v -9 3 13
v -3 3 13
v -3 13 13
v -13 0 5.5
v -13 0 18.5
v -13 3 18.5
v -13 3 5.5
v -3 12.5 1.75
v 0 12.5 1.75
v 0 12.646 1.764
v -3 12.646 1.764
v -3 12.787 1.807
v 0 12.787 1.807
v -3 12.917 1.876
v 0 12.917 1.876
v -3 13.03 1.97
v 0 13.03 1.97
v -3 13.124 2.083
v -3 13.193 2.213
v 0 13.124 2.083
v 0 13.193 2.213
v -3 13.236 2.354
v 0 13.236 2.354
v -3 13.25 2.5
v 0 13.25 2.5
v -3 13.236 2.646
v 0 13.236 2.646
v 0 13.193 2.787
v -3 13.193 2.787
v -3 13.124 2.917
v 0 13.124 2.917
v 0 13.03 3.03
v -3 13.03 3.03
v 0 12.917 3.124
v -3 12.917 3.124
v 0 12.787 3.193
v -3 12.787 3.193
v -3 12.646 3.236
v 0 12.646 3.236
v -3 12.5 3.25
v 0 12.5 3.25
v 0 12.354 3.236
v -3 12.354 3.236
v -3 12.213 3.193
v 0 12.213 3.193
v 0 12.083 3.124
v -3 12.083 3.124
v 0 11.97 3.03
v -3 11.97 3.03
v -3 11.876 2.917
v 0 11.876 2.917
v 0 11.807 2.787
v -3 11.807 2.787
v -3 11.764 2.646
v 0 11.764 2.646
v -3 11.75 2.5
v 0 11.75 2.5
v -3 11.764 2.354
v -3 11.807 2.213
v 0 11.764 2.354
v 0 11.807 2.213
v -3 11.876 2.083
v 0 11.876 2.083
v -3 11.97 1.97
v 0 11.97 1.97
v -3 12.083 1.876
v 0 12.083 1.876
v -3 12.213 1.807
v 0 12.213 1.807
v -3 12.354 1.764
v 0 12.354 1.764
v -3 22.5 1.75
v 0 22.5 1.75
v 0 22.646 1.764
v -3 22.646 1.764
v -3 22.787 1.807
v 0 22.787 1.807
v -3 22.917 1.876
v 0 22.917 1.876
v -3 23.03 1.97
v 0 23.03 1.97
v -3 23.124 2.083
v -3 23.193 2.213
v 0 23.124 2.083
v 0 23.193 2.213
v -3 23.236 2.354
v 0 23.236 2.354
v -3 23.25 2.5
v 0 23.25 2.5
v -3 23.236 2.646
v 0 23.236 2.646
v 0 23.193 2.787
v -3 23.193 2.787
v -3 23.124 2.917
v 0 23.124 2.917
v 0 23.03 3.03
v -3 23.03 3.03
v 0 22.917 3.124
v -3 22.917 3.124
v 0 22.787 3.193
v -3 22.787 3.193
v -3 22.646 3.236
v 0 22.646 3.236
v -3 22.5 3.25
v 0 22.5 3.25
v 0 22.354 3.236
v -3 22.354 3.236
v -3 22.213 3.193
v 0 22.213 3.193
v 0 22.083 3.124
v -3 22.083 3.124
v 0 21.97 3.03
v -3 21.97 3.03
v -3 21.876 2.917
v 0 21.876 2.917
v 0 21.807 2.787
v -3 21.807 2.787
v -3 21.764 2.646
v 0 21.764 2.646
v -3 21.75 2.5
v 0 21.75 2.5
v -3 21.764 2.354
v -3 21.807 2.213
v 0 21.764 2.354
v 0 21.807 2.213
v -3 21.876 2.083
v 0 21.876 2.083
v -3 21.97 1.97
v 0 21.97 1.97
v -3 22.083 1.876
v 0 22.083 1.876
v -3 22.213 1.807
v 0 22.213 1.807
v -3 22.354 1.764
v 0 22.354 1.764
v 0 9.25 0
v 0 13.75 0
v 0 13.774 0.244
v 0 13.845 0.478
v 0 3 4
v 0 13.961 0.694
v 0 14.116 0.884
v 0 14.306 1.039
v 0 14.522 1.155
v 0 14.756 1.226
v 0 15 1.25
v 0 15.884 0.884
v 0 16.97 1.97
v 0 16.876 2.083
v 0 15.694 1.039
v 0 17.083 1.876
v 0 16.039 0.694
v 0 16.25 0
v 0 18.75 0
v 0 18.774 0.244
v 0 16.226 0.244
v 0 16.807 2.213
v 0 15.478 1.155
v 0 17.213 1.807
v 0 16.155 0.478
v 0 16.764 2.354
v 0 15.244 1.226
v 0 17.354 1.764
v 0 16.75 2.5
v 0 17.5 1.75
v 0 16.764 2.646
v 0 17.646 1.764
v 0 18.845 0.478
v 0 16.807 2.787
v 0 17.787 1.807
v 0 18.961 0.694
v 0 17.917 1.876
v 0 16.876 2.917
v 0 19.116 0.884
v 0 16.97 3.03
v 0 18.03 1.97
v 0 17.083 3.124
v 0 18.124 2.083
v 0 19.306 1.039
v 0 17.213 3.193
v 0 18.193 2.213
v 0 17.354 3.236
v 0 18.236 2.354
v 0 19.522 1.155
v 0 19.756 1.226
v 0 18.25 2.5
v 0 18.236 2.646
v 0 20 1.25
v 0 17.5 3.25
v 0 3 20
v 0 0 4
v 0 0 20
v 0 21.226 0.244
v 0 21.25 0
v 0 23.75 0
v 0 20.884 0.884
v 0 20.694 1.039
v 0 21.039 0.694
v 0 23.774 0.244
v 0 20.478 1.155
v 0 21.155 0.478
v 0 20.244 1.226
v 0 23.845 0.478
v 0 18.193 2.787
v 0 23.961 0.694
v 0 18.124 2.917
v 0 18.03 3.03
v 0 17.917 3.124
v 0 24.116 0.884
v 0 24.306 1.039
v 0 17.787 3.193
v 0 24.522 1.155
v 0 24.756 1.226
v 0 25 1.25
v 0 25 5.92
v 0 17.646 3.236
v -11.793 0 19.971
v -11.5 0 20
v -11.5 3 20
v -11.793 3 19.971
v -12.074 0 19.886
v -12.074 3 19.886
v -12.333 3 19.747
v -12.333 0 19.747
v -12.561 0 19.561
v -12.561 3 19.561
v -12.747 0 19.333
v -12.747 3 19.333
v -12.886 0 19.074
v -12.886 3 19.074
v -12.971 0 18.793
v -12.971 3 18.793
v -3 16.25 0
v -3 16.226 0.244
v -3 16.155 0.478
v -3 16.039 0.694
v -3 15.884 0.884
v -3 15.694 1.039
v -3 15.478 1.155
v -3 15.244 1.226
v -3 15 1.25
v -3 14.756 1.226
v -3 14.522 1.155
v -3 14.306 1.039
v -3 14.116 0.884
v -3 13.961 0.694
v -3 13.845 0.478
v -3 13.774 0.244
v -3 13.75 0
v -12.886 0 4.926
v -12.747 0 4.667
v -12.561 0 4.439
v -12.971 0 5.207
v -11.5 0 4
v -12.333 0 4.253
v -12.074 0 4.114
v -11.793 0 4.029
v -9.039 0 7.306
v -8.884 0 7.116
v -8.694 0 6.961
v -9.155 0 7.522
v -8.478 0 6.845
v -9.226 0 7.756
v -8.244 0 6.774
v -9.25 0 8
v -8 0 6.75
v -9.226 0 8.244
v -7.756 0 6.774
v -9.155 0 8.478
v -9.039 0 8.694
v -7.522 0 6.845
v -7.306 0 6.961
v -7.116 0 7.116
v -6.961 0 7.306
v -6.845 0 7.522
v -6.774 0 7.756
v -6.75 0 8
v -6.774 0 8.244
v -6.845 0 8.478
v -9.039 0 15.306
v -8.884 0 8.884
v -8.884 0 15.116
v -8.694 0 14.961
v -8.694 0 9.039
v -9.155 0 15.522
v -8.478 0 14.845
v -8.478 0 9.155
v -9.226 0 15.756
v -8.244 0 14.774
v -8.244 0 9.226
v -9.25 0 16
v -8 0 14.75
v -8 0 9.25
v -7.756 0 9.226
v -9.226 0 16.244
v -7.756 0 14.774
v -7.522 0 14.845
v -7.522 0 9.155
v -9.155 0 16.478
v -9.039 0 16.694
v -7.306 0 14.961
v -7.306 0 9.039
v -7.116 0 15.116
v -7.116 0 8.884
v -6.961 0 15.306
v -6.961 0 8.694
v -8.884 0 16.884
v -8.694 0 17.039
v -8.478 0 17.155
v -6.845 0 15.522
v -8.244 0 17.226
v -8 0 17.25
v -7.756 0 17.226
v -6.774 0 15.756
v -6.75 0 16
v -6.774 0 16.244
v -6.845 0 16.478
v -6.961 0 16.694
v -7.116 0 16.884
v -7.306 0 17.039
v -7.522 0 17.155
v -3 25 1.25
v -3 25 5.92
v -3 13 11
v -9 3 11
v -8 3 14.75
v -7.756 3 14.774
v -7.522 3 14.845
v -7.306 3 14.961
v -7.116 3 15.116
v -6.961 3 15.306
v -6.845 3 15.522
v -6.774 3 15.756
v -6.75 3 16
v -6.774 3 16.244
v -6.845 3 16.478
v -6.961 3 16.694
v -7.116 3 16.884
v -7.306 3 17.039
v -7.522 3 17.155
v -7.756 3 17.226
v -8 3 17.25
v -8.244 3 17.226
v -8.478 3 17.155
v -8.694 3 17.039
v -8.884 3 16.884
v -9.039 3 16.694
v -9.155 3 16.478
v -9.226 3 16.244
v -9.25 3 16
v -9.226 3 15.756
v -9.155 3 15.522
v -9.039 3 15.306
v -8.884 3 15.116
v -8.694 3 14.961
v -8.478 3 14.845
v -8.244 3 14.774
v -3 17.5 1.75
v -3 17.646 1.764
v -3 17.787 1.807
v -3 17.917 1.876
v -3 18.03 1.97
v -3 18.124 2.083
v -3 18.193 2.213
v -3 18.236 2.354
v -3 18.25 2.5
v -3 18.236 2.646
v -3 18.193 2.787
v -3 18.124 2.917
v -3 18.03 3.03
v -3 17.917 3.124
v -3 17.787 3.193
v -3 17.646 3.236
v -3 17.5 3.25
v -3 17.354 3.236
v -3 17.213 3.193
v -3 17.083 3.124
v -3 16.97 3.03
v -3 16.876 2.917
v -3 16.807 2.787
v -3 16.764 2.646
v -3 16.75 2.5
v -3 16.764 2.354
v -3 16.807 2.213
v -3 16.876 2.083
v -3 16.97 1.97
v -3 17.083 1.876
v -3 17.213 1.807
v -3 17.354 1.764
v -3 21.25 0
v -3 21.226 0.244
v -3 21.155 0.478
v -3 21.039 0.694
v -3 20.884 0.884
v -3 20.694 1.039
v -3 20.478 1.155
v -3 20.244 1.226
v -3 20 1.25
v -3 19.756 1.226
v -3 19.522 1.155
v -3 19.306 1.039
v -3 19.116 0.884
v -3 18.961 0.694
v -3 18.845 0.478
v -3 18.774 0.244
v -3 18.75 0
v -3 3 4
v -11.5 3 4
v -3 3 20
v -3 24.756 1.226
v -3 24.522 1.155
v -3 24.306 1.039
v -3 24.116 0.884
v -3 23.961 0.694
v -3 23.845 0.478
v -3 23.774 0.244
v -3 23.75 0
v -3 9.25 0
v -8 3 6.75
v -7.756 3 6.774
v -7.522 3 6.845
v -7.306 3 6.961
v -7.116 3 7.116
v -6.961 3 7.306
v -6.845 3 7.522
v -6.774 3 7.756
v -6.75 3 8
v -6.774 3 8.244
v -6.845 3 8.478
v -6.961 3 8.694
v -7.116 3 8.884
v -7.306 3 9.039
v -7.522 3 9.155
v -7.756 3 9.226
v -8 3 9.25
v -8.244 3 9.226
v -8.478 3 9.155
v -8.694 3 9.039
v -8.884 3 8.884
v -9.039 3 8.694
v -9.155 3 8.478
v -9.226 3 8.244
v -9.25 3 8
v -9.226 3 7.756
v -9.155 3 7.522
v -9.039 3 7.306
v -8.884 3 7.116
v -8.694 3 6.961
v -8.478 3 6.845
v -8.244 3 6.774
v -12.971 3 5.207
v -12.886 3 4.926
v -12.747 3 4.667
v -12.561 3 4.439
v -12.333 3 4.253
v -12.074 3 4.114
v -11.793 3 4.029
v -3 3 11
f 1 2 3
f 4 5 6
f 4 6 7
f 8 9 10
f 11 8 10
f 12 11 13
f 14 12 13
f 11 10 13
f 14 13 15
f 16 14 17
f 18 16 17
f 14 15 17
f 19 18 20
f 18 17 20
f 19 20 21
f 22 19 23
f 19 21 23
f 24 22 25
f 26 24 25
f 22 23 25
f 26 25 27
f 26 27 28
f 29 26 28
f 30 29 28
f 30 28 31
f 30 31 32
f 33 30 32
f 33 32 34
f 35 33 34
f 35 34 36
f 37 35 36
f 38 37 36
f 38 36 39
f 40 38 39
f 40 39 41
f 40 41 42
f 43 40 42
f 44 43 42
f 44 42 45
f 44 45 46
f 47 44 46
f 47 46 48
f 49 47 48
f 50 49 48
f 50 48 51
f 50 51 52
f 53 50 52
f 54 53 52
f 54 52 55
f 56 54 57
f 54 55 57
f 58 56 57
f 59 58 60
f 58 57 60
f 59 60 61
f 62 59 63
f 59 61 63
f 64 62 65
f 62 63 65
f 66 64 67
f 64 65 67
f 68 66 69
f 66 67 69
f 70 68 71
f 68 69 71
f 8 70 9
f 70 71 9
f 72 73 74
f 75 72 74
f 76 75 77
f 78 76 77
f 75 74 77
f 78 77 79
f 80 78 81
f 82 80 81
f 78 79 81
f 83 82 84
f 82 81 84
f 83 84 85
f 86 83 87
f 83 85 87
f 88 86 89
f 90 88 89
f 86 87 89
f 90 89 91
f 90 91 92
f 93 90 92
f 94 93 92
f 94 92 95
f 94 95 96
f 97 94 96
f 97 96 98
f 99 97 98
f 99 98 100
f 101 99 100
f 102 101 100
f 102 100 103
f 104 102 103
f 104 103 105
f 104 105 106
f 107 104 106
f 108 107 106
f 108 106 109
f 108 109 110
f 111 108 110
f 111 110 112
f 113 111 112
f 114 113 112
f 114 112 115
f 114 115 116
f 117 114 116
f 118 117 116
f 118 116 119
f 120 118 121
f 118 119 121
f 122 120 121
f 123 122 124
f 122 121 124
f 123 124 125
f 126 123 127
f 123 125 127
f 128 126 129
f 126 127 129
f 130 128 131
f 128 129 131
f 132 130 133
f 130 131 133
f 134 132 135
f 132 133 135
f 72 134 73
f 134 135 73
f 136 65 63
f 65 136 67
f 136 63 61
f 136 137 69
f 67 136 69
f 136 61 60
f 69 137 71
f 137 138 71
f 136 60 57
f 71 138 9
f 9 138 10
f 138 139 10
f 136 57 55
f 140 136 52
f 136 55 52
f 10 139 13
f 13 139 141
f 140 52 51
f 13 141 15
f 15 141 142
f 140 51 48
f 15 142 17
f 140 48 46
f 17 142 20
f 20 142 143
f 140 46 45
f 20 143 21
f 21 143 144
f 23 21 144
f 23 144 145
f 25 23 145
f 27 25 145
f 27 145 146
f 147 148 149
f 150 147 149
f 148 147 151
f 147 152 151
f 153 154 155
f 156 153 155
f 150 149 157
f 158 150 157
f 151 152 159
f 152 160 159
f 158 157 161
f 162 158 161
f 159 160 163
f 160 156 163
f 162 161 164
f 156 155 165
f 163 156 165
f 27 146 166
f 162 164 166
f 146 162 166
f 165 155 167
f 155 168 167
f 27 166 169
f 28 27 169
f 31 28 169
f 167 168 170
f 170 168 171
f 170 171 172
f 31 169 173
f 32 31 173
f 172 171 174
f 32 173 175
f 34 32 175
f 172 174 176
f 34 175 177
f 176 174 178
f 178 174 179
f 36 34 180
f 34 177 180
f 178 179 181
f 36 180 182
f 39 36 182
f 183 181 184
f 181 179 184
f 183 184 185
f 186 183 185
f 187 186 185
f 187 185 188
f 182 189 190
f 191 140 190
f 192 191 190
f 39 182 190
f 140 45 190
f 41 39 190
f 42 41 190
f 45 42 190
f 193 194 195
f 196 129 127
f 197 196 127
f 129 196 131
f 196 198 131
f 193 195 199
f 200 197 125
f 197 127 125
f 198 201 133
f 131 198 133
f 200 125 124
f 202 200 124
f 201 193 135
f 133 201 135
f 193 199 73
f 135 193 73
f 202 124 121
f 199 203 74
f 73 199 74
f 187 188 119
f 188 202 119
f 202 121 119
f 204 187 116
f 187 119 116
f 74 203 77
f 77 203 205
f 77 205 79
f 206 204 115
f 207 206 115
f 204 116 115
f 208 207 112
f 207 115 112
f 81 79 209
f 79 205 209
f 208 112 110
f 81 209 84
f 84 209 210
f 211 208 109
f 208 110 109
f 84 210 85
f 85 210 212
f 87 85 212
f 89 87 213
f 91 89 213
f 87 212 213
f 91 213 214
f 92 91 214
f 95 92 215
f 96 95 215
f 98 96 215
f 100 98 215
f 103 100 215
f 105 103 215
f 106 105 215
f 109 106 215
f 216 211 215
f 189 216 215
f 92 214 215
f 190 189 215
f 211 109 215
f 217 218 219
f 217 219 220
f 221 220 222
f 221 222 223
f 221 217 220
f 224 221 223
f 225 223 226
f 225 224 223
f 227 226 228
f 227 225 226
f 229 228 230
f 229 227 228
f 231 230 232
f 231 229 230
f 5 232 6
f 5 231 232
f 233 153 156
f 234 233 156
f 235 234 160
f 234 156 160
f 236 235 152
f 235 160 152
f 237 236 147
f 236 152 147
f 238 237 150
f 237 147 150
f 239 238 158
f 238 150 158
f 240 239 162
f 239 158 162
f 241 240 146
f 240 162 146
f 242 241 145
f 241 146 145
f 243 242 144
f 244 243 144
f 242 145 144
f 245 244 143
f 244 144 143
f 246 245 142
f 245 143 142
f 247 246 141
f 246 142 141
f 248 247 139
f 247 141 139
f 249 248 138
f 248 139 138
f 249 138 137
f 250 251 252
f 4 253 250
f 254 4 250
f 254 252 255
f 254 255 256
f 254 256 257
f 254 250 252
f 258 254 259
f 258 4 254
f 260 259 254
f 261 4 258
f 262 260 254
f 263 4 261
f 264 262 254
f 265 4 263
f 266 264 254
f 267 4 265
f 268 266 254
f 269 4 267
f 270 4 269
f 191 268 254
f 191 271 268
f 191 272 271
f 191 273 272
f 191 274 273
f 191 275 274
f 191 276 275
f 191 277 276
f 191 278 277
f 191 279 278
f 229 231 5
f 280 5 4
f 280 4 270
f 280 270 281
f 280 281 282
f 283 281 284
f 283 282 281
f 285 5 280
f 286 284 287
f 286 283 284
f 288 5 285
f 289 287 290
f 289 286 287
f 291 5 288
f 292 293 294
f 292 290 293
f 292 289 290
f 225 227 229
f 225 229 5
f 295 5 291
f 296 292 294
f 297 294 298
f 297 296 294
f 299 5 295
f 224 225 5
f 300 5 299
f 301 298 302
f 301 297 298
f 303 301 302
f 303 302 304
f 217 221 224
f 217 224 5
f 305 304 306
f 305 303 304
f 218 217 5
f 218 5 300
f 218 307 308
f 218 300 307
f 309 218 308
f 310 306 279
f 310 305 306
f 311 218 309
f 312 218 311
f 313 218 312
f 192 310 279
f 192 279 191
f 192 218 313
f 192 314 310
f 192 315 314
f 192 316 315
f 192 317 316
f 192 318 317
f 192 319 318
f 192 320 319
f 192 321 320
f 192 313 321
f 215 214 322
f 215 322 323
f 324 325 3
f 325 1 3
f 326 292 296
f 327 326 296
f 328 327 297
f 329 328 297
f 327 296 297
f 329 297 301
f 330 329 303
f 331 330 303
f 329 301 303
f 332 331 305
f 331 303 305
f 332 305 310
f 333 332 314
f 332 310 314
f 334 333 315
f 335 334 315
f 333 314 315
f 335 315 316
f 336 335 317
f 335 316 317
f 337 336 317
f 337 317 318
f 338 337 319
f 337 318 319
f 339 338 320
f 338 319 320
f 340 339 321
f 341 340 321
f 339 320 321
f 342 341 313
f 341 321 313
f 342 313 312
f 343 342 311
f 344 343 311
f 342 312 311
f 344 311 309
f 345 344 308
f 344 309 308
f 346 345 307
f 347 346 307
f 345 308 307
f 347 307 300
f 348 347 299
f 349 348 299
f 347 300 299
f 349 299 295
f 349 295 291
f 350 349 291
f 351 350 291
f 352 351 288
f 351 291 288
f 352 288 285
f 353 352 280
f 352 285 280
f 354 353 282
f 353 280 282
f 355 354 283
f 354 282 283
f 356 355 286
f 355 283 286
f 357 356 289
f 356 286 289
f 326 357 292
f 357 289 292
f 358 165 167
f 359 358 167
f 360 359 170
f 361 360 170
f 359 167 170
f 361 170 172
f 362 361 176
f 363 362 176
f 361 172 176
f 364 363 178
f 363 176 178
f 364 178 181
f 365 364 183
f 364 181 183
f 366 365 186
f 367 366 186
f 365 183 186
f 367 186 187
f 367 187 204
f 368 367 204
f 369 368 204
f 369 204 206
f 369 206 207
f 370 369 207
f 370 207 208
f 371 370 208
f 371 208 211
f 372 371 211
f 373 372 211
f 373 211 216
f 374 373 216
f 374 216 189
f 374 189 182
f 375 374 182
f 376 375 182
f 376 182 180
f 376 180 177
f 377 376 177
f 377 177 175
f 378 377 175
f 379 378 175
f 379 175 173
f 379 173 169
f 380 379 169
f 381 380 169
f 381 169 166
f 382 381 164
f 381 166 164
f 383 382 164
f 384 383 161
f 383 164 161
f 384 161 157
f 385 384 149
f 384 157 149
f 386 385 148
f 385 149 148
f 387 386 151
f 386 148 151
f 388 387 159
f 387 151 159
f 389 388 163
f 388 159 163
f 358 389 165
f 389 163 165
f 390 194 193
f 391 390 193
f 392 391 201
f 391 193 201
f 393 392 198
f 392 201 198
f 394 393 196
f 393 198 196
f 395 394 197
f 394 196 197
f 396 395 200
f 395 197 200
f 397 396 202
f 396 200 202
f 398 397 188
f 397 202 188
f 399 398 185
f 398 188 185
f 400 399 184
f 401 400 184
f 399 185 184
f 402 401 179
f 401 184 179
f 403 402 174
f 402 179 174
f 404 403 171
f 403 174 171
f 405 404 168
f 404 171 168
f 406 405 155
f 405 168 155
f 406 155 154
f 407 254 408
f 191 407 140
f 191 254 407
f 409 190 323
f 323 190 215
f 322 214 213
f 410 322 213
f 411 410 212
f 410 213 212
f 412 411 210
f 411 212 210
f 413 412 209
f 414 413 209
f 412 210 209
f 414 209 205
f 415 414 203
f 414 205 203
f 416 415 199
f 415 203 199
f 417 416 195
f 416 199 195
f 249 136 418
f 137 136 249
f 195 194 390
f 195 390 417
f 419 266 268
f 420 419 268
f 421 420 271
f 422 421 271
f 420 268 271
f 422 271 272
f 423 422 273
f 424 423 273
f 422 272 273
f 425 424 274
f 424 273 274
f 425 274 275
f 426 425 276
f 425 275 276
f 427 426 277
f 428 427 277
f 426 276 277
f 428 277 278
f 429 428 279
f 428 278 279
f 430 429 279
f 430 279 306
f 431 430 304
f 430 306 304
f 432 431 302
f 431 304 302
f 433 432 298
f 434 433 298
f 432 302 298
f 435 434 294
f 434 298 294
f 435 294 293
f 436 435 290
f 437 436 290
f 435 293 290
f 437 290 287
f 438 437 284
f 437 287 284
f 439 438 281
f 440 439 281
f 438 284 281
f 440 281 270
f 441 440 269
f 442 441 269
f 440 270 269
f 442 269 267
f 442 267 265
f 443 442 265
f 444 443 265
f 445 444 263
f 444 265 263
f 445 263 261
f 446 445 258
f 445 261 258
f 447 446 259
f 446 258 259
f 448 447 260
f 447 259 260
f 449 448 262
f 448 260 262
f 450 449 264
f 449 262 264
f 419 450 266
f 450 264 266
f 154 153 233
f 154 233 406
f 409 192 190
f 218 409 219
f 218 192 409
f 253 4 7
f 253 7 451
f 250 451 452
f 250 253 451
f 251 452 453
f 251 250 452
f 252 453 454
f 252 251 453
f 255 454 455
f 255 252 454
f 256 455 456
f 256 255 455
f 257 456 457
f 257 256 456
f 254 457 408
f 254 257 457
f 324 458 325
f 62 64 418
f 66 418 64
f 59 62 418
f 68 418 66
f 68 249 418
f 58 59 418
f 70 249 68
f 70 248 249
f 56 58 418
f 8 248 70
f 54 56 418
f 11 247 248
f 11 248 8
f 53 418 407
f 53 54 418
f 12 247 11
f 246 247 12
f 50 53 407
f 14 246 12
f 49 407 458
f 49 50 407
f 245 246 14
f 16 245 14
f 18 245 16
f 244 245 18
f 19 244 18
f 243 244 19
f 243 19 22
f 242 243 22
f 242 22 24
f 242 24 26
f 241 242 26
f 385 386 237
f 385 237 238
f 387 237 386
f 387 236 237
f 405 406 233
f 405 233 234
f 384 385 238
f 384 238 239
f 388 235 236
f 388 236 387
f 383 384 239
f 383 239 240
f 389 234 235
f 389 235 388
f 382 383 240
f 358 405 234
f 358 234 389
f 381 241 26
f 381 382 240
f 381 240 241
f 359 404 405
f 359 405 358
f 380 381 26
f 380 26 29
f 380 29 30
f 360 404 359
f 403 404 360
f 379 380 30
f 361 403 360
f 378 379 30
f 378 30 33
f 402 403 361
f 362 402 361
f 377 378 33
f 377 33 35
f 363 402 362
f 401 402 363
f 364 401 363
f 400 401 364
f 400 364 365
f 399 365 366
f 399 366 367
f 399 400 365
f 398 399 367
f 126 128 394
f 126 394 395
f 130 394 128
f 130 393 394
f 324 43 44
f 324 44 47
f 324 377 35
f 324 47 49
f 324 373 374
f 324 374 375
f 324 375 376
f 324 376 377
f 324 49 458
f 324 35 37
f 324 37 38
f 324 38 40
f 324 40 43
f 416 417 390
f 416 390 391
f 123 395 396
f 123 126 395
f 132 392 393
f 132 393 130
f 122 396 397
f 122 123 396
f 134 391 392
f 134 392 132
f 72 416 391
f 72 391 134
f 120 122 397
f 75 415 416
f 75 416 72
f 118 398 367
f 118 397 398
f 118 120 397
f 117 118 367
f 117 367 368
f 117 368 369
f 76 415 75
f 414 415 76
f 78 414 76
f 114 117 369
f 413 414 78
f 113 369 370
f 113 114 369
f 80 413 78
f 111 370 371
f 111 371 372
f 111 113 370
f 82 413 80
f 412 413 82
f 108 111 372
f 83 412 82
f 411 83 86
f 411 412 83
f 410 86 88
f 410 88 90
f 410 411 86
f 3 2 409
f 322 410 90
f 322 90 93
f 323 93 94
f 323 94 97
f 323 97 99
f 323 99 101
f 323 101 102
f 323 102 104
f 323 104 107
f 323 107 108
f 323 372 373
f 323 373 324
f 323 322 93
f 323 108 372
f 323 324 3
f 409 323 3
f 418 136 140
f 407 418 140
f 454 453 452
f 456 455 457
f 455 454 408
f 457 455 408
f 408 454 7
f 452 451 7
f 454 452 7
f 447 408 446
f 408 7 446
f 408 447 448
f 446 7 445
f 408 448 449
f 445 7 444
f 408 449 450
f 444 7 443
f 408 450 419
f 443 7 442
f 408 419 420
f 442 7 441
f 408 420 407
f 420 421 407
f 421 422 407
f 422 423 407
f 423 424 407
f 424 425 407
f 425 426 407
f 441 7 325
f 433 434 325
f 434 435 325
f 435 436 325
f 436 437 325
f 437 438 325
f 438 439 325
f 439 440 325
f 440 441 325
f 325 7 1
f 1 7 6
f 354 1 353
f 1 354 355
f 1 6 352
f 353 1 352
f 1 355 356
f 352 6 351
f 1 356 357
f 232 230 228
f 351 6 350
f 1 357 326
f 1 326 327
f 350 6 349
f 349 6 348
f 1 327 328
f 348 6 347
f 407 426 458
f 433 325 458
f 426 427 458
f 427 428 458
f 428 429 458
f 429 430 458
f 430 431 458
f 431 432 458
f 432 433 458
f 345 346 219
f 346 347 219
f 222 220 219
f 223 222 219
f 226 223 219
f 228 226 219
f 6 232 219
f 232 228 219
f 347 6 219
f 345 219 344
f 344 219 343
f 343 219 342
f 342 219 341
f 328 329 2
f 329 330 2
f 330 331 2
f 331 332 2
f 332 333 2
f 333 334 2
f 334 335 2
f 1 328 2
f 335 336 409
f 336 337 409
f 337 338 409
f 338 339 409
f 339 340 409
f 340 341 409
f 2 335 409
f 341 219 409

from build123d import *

# Parameters (mm, degrees)
SKETCH1_R          = 1.25
EXTRUDE1_DEPTH     = 3
SKETCH2_R          = 1.25
EXTRUDE2_DEPTH     = 3
EXTRUDE4_DEPTH     = 1
CUT_EXTRUDE1_REACH = 15
SKETCH6_R          = 0.75


with BuildPart() as part:
    # Sketch1 → Extrude1 (new body)
    with BuildSketch(Plane(origin=(0, 0, 0), x_dir=(0, 0, -1), z_dir=(1, 0, 0))):
        with BuildLine():
            Line((4, 30), (4, 15.5))
            Line((4, 15.5), (-4, 3))
            Line((-4, 3), (-4, 0))
            Line((-4, 0), (-20, 0))
            Line((-20, 0), (-20, 3))
            Line((-20, 3), (-4, 28))
            Line((-4, 28), (-4, 30))
            ThreePointArc((-4, 30), (0, 34), (4, 30))
        make_face()
        with Locations((0, 15)):
            Circle(SKETCH1_R, mode=Mode.SUBTRACT)
        with Locations((0, 20)):
            Circle(SKETCH1_R, mode=Mode.SUBTRACT)
        with Locations((0, 25)):
            Circle(SKETCH1_R, mode=Mode.SUBTRACT)
        with Locations((0, 30)):
            Circle(SKETCH1_R, mode=Mode.SUBTRACT)
    extrude(amount=-EXTRUDE1_DEPTH)

    # Sketch2 → Extrude2 (add)
    with BuildSketch(Plane.XZ):
        with BuildLine():
            Line((-3, 20), (-11.5, 20))
            ThreePointArc((-11.5, 20), (-12.560660172, 19.560660172), (-13, 18.5))
            Line((-13, 18.5), (-13, 5.5))
            ThreePointArc((-13, 5.5), (-12.560660172, 4.439339828), (-11.5, 4))
            Line((-11.5, 4), (-3, 4))
            Line((-3, 4), (-3, 20))
        make_face()
        with Locations(Location((-8, 16, 0), (0, 0, 270))):  # turned: the seam where the file's is
            Circle(SKETCH2_R, mode=Mode.SUBTRACT)
        with Locations(Location((-8, 8, 0), (0, 0, 270))):  # turned: the seam where the file's is
            Circle(SKETCH2_R, mode=Mode.SUBTRACT)
    extrude(amount=-EXTRUDE2_DEPTH)

    # Sketch5 → Extrude4 (add, symmetric)
    with BuildSketch(Plane.XY.offset(12)):
        Polygon((-3, 3), (-9, 3), (-3, 13), align=None)
    extrude(amount=EXTRUDE4_DEPTH, both=True)

    # Sketch6 → Cut-Extrude1 (cut, up to next)
    with BuildSketch(Plane(origin=(0, 0, 0), x_dir=(0, 0, -1), z_dir=(1, 0, 0)), mode=Mode.PRIVATE) as cut_extrude1_sk1:
        with Locations((-2.5, 12.5)):
            Circle(SKETCH6_R)
    cut_extrude1_tool1 = extrude(cut_extrude1_sk1.sketch, amount=-CUT_EXTRUDE1_REACH, mode=Mode.PRIVATE) & part.part
    add(cut_extrude1_tool1.solids().sort_by_distance((0, 12.5, 2.5))[0], mode=Mode.SUBTRACT)
    # Sketch6 → Cut-Extrude1 (cut, up to next)
    with BuildSketch(Plane(origin=(0, 0, 0), x_dir=(0, 0, -1), z_dir=(1, 0, 0)), mode=Mode.PRIVATE) as cut_extrude1_sk2:
        with Locations((-2.5, 22.5)):
            Circle(SKETCH6_R)
    cut_extrude1_tool2 = extrude(cut_extrude1_sk2.sketch, amount=-CUT_EXTRUDE1_REACH, mode=Mode.PRIVATE) & part.part
    add(cut_extrude1_tool2.solids().sort_by_distance((0, 22.5, 2.5))[0], mode=Mode.SUBTRACT)
    # Sketch6 → Cut-Extrude1 (cut, up to next)
    with BuildSketch(Plane(origin=(0, 0, 0), x_dir=(0, 0, -1), z_dir=(1, 0, 0)), mode=Mode.PRIVATE) as cut_extrude1_sk3:
        with Locations((-2.5, 17.5)):
            Circle(SKETCH6_R)
    cut_extrude1_tool3 = extrude(cut_extrude1_sk3.sketch, amount=-CUT_EXTRUDE1_REACH, mode=Mode.PRIVATE) & part.part
    add(cut_extrude1_tool3.solids().sort_by_distance((0, 17.5, 2.5))[0], mode=Mode.SUBTRACT)
    # Sketch6 → Cut-Extrude1 (cut, up to next)
    with BuildSketch(Plane(origin=(0, 0, 0), x_dir=(0, 0, -1), z_dir=(1, 0, 0)), mode=Mode.PRIVATE) as cut_extrude1_sk4:
        Polygon((0, 0), (0, 25), (-8, 25), (-8, 35), (7, 35), (7, 0), align=None)
    cut_extrude1_tool4 = extrude(cut_extrude1_sk4.sketch, amount=-CUT_EXTRUDE1_REACH, mode=Mode.PRIVATE) & part.part
    add(cut_extrude1_tool4.solids().sort_by_distance((0, 20.576923, -1.653846))[0], mode=Mode.SUBTRACT)


solid = part.part
